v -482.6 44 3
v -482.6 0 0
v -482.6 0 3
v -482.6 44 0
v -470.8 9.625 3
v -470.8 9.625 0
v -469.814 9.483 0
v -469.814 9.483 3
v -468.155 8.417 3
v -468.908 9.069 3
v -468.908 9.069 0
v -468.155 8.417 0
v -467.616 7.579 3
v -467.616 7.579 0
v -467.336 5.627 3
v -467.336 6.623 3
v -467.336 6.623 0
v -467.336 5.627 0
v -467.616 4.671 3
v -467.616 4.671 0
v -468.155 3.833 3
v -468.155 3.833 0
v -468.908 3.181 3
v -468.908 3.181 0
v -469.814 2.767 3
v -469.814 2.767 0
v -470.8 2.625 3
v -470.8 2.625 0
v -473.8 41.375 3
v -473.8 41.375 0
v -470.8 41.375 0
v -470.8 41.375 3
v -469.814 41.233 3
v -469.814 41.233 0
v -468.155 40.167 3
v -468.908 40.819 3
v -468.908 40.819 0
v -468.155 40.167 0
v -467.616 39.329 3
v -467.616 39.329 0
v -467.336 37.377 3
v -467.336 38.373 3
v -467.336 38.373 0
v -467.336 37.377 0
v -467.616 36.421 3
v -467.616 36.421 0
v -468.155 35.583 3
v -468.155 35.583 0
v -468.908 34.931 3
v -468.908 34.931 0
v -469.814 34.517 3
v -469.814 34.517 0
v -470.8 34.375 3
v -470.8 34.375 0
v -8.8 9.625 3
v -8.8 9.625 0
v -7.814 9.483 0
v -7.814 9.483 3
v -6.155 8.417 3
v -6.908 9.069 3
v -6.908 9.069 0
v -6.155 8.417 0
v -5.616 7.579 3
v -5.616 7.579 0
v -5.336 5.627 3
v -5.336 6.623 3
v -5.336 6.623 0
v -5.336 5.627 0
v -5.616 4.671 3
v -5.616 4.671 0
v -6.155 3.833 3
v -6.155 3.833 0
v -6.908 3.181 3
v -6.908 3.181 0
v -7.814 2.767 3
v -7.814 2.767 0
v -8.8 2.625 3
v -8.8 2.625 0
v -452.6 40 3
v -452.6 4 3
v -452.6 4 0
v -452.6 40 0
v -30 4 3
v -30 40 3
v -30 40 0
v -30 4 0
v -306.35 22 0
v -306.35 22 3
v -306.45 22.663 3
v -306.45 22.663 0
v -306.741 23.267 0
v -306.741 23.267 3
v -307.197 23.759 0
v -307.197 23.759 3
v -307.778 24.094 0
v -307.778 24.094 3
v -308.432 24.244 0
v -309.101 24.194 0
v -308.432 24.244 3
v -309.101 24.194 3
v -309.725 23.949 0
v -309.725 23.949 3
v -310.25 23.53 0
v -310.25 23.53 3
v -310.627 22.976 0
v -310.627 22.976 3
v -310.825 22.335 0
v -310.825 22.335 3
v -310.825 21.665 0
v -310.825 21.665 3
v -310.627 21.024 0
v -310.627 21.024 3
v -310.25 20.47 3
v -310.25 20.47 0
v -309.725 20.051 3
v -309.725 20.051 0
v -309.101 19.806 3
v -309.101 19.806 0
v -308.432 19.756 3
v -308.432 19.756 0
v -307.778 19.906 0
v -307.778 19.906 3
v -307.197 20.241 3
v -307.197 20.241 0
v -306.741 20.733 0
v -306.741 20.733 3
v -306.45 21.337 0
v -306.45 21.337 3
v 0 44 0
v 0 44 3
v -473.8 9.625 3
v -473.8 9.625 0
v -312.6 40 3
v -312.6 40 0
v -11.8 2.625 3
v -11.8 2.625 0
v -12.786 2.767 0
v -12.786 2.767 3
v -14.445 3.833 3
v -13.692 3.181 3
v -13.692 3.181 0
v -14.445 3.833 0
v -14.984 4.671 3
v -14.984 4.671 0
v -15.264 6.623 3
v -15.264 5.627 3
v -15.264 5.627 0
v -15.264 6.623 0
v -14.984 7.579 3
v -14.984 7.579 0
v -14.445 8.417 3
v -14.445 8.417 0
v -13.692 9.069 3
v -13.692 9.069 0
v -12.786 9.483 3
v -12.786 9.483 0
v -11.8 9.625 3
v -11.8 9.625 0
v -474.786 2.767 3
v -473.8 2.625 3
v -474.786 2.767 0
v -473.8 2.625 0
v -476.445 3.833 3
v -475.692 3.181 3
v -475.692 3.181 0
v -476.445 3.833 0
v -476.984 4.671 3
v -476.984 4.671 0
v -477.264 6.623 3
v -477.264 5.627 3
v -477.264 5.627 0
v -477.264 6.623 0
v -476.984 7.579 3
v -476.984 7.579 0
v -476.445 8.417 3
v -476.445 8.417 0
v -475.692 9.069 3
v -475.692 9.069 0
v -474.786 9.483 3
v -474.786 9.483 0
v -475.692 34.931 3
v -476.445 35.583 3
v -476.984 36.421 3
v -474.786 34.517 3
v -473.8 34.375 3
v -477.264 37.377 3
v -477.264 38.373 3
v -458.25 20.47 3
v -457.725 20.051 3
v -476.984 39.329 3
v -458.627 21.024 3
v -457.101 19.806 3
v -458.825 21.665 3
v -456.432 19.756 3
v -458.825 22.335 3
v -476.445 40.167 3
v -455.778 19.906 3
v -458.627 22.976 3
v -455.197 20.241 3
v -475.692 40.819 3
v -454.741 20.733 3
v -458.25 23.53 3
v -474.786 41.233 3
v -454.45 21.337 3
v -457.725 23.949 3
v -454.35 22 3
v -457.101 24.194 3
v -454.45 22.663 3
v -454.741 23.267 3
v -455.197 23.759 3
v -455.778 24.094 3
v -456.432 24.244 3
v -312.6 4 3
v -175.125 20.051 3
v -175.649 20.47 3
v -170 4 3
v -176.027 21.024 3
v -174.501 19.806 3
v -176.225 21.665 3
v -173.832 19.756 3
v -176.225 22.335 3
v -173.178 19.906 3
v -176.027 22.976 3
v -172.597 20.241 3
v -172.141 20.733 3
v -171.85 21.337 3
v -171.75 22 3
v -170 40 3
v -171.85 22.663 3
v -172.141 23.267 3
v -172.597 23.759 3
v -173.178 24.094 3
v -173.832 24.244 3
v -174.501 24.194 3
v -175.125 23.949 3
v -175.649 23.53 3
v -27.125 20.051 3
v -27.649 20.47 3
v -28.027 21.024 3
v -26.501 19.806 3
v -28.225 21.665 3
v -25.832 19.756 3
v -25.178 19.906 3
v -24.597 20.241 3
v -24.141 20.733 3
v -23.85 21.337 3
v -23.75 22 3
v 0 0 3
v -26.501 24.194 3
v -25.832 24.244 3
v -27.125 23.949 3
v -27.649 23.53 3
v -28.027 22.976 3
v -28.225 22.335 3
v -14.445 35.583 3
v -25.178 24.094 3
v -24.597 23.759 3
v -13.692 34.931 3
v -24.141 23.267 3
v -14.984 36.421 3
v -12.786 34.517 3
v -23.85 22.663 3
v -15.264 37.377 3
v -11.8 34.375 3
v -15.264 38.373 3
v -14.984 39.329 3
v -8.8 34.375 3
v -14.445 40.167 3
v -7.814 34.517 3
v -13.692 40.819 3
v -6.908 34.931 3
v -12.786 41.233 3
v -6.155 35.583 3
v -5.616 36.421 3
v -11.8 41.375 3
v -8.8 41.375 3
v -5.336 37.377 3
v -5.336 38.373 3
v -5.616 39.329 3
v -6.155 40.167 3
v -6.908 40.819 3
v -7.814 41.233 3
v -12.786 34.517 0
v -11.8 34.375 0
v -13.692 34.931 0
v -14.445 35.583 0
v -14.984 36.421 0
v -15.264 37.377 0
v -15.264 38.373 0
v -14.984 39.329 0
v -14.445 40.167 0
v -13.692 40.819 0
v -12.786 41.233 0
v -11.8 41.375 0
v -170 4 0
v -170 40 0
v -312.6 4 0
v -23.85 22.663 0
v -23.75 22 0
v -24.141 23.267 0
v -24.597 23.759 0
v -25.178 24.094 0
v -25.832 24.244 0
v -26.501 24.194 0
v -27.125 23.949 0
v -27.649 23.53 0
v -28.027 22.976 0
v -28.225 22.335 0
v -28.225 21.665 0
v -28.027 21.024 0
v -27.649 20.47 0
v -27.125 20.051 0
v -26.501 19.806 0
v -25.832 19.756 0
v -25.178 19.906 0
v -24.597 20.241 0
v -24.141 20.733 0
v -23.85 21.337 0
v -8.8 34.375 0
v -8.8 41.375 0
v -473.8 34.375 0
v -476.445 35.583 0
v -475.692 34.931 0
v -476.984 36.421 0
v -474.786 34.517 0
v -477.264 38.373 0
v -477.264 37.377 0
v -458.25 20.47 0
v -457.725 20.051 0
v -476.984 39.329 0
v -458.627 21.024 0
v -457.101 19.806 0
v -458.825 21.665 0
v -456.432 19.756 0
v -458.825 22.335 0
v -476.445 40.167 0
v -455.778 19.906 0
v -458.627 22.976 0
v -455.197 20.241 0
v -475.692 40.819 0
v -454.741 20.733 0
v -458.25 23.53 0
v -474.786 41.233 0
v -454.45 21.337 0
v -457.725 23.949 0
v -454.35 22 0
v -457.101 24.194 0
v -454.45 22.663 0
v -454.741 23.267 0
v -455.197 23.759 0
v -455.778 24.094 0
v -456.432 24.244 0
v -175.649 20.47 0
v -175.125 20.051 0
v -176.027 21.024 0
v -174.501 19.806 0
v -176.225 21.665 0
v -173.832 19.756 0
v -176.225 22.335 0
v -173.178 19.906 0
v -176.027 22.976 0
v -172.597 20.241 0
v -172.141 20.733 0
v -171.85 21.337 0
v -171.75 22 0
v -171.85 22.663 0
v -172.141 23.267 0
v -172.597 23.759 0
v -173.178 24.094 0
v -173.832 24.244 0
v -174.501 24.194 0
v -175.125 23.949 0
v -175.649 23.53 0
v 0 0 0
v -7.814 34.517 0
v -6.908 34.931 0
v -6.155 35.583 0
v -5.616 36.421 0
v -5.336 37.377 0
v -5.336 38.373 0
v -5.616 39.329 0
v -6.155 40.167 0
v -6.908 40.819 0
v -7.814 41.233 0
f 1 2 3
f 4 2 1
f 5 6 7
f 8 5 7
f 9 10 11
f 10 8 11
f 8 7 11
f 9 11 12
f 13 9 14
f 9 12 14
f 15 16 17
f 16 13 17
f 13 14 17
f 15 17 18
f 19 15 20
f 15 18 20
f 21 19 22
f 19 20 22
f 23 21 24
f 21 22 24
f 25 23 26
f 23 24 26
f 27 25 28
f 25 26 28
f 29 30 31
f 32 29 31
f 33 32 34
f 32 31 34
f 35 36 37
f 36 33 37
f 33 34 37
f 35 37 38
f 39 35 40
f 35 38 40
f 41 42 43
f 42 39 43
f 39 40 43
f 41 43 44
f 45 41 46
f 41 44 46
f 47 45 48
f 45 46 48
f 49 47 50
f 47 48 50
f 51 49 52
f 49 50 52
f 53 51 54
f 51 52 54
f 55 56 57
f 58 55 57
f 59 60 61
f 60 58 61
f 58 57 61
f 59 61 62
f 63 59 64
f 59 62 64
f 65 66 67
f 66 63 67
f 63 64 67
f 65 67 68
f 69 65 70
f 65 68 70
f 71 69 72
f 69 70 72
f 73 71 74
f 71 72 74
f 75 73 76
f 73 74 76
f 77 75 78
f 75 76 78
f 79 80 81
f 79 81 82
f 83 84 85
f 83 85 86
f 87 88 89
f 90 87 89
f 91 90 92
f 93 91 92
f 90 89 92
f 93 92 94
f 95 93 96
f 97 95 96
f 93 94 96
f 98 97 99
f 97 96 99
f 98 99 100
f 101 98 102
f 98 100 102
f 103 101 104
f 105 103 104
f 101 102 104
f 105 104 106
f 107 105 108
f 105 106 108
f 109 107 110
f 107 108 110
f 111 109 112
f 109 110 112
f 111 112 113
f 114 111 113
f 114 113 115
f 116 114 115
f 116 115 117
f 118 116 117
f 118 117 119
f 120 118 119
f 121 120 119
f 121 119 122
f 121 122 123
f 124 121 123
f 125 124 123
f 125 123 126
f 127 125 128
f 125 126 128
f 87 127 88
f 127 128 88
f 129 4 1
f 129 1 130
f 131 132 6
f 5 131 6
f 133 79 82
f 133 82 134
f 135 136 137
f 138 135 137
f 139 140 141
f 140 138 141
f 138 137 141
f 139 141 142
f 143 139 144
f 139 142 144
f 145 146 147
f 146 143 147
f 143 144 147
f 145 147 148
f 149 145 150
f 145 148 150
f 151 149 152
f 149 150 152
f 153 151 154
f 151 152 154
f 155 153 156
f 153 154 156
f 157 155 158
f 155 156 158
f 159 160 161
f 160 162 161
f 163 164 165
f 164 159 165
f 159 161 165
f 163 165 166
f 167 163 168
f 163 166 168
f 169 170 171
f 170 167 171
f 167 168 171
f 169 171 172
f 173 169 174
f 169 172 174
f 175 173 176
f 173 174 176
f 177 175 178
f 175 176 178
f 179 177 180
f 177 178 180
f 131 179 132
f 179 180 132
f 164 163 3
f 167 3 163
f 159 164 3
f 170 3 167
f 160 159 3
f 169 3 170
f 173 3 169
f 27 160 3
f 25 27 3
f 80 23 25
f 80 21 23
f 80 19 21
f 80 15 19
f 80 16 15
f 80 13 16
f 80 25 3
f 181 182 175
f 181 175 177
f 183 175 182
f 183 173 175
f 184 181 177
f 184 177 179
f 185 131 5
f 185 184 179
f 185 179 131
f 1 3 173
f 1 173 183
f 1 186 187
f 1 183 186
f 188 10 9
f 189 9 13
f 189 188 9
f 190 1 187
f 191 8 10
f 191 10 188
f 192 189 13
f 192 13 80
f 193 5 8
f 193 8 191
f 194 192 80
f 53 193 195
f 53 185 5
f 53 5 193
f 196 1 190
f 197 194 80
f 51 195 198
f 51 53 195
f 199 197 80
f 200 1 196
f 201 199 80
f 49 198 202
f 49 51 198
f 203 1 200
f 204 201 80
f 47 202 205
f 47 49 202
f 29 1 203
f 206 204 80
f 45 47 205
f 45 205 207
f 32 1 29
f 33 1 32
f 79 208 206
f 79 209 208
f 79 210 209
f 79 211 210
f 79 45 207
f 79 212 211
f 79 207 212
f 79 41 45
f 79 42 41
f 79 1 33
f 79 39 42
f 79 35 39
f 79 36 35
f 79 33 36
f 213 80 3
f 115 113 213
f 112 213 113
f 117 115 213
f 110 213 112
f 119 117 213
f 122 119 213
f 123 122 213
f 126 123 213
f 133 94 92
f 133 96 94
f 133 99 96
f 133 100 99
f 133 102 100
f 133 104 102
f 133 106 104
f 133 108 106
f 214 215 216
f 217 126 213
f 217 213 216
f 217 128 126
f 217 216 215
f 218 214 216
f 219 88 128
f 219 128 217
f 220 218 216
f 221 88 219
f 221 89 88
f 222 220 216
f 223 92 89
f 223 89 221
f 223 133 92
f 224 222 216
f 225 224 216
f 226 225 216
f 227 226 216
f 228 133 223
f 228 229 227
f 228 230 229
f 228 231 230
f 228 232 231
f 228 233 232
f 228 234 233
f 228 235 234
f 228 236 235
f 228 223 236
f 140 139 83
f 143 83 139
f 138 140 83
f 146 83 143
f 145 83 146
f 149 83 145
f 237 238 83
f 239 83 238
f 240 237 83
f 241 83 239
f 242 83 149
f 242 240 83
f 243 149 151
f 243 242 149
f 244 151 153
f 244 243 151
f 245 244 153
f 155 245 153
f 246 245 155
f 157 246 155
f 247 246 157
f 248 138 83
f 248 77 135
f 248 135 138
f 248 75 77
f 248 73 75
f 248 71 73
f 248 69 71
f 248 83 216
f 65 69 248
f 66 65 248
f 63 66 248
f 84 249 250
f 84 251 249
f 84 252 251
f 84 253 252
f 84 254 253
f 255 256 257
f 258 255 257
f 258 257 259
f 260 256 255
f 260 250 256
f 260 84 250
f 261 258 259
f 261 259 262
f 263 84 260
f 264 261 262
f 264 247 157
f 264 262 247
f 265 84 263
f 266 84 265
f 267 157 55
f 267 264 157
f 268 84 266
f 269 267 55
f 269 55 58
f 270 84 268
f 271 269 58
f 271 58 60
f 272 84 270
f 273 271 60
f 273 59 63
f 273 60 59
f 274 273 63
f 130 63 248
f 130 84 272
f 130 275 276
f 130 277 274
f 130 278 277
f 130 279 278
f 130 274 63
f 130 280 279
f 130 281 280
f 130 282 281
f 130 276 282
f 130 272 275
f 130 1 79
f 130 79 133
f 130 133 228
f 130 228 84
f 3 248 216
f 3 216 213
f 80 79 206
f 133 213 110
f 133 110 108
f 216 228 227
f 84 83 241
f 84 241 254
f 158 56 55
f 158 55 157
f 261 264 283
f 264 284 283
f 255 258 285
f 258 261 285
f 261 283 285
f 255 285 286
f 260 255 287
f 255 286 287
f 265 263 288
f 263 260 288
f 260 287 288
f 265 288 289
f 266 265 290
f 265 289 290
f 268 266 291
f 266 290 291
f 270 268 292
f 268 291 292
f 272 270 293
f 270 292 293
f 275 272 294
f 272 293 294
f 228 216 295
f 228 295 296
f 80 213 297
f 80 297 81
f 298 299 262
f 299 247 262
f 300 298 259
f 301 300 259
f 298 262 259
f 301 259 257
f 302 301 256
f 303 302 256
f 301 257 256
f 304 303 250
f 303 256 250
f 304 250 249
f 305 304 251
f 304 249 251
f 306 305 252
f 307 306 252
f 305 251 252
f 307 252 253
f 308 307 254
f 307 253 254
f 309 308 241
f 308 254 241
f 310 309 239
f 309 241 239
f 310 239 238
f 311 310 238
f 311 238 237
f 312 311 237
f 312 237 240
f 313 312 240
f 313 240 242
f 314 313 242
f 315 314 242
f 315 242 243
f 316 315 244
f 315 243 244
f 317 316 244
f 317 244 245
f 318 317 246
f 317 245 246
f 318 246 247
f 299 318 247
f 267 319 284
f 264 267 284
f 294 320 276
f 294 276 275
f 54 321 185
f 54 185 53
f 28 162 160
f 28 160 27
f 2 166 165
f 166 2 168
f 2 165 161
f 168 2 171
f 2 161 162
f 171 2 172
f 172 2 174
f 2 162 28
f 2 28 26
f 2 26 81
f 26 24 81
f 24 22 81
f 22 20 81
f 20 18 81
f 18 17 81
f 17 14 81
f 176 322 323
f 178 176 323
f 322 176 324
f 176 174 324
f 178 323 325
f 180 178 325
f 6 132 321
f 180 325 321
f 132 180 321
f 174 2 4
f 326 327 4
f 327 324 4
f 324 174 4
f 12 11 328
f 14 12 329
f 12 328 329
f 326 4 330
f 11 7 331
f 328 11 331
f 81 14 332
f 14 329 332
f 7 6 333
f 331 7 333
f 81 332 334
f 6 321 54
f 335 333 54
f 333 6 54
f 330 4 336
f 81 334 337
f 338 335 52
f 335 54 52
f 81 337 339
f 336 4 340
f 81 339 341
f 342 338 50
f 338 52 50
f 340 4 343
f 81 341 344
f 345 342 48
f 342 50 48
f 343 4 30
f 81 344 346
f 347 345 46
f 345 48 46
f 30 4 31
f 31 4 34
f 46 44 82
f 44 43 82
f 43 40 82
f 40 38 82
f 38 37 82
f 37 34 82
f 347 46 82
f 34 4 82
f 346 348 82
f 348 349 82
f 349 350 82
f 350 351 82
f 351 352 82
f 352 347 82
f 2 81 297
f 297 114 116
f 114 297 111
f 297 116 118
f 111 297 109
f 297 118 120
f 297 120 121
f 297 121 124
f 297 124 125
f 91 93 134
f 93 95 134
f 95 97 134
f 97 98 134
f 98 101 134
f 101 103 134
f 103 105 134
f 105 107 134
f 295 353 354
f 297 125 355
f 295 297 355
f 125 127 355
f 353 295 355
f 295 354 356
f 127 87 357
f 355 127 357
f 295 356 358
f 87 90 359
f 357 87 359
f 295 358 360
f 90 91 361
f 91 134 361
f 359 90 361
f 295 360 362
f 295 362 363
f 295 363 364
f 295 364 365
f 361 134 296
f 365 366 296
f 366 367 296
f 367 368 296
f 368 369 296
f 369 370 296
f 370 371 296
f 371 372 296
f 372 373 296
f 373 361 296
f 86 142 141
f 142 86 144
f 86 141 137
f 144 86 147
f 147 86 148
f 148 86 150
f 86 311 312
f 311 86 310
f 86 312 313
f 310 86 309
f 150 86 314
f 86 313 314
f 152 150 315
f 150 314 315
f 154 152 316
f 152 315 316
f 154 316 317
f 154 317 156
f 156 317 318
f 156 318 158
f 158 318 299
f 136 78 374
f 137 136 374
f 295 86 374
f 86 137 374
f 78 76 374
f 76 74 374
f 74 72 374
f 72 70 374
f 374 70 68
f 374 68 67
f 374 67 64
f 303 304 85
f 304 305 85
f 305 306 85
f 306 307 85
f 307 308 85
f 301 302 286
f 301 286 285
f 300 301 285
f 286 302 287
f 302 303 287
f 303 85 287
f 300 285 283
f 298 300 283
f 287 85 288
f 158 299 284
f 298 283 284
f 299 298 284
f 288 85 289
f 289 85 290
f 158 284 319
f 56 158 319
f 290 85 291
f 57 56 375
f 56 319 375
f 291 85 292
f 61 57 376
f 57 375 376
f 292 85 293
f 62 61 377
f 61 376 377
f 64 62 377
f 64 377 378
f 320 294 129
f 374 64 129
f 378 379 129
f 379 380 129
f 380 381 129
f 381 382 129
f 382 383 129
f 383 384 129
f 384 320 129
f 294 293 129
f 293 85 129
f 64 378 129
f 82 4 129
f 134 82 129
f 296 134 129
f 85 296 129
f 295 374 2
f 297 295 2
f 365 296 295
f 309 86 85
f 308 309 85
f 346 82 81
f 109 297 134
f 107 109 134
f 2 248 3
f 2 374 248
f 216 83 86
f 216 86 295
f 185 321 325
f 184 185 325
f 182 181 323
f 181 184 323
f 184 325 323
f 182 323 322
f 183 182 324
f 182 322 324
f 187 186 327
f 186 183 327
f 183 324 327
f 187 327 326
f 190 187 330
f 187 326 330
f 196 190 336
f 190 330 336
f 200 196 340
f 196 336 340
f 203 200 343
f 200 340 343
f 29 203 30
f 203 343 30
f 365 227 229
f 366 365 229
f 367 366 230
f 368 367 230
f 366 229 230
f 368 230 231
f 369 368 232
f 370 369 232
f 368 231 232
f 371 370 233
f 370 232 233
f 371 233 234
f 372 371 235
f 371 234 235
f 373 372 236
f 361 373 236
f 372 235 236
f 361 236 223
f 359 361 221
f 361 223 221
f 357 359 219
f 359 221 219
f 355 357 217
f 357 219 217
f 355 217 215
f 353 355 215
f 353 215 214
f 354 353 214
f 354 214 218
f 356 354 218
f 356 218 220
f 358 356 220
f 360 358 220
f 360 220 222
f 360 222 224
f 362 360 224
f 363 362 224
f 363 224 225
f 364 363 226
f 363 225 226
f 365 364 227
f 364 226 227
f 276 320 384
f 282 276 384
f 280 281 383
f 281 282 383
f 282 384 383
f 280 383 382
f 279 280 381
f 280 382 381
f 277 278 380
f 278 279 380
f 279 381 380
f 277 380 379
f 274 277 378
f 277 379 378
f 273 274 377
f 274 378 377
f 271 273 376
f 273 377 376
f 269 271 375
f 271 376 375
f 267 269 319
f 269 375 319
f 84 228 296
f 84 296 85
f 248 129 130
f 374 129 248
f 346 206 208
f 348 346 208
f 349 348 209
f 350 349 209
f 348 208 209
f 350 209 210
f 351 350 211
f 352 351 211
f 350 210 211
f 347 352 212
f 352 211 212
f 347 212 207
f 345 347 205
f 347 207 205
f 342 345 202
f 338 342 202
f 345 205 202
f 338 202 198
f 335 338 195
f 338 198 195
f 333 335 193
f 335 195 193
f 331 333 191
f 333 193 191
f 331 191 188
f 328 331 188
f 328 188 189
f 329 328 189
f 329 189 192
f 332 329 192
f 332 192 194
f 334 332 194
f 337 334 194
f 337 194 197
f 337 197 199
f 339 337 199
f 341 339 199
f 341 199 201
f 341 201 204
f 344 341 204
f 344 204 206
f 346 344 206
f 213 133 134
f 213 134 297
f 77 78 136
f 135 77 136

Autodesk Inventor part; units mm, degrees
ref_plane "YZ Plane" through (0, 0, 0) normal (1, 0, 0) x (0, 1, 0)
ref_plane "XZ Plane" through (0, 0, 0) normal (0, 1, 0) x (-1, 0, 0)
ref_plane "XY Plane" through (0, 0, 0) normal (0, 0, 1) x (1, 0, 0)
sketch "Sketch1" plane through (0, 0, 0) normal (0, 0, 1) x (1, 0, 0)
  line L0 (0, 0) -> (-482.6, 0)
  line L1 (-482.6, 0) -> (-482.6, 44)
  line L2 (-482.6, 44) -> (0, 44)
  line L3 (0, 44) -> (0, 0)
  arc A0 (-473.8, 41.375) -> (-473.8, 34.375) centre (-473.8, 37.875) ccw
  arc A1 (-473.8, 9.625) -> (-473.8, 2.625) centre (-473.8, 6.125) ccw
  arc A2 (-8.8, 34.375) -> (-8.8, 41.375) centre (-8.8, 37.875) ccw
  arc A3 (-8.8, 2.625) -> (-8.8, 9.625) centre (-8.8, 6.125) ccw
  line L4 (-473.8, 41.375) -> (-470.8, 41.375)
  line L5 (-473.8, 34.375) -> (-470.8, 34.375)
  arc A4 (-470.8, 34.375) -> (-470.8, 41.375) centre (-470.8, 37.875) ccw
  line L6 (-8.8, 41.375) -> (-11.8, 41.375)
  line L7 (-8.8, 34.375) -> (-11.8, 34.375)
  arc A5 (-11.8, 41.375) -> (-11.8, 34.375) centre (-11.8, 37.875) ccw
  line L8 (-8.8, 9.625) -> (-11.8, 9.625)
  line L9 (-8.8, 2.625) -> (-11.8, 2.625)
  arc A6 (-11.8, 9.625) -> (-11.8, 2.625) centre (-11.8, 6.125) ccw
  line L10 (-473.8, 9.625) -> (-470.8, 9.625)
  line L11 (-473.8, 2.625) -> (-470.8, 2.625)
  arc A7 (-470.8, 2.625) -> (-470.8, 9.625) centre (-470.8, 6.125) ccw
  dimension "d0" = 44
  dimension "d1" = 482.6
  dimension "d5" = 31.75
  dimension "d6" = 7
  dimension "d8" = 31.75
  dimension "d9" = 465
  dimension "d10" = 465
  dimension "d11" = 8.8
  dimension "d12" = 8.8
  dimension "d13" = 6.125
  dimension "d14" = 6.125
  dimension "d15" = 6.125
  dimension "d16" = 8.8
  dimension "d17" = 8.8
  dimension "d18" = 6.125
  dimension "d43" = 3
  dimension "d45" = 3.5
extrude "Frame" add sketch "Sketch1" along normal blind 3
sketch "Sketch2" plane through (0, 0, 3) normal (0, 0, 1) x (1, 0, 0)
  line L0 (-30, 4) -> (-170, 4)
  line L1 (-170, 4) -> (-170, 40)
  line L2 (-170, 40) -> (-30, 40)
  line L3 (-30, 40) -> (-30, 4)
  line L4 (-452.6003, 40) -> (-312.6003, 40)
  line L5 (-312.6003, 40) -> (-312.6003, 4)
  line L6 (-312.6003, 4) -> (-452.6003, 4)
  line L7 (-452.6003, 4) -> (-452.6003, 40)
  line L8 (0, 0) -> (0, 44) projected
  line L9 (0, 44) -> (-482.6, 44) projected
  line L10 (-482.6, 44) -> (-482.6, 0) projected
  point P0 (-30, 22)
  point P1 (-312.6003, 22)
  dimension "d21" = 140
  dimension "d22" = 36
  dimension "d25" = 30
  dimension "d26" = 22
  dimension "d27" = 22
  dimension "d28" = 29.9997
extrude "PI_Holes" cut sketch "Sketch2" against normal blind 5
sketch "Sketch4" plane through (0, 0, 3) normal (0, 0, 1) x (1, 0, 0)
  circle A0 centre (-26, 22) radius 2 projected
  circle A1 centre (-174, 22) radius 2 projected
  circle A2 centre (-308.6003, 22) radius 2 projected
  circle A3 centre (-456.6003, 22) radius 2 projected
  circle A4 centre (-456.6003, 22) radius 2.25
  circle A5 centre (-308.6003, 22) radius 2.25
  circle A6 centre (-174, 22) radius 2.25
  circle A7 centre (-26, 22) radius 2.25
  point P0 (0, 0)
  dimension "d35" = 4
  dimension "d36" = 4.5
  dimension "d37" = 4.5
  dimension "d38" = 4.5
  dimension "d39" = 4.5
extrude "Mounting_Holes" cut sketch "Sketch4" against normal through all contours A0 | A1 | A2 | A3 | A4 | A5 | A6 | A7
properties part number "WoodPanel" material "Wood (Walnut)"
